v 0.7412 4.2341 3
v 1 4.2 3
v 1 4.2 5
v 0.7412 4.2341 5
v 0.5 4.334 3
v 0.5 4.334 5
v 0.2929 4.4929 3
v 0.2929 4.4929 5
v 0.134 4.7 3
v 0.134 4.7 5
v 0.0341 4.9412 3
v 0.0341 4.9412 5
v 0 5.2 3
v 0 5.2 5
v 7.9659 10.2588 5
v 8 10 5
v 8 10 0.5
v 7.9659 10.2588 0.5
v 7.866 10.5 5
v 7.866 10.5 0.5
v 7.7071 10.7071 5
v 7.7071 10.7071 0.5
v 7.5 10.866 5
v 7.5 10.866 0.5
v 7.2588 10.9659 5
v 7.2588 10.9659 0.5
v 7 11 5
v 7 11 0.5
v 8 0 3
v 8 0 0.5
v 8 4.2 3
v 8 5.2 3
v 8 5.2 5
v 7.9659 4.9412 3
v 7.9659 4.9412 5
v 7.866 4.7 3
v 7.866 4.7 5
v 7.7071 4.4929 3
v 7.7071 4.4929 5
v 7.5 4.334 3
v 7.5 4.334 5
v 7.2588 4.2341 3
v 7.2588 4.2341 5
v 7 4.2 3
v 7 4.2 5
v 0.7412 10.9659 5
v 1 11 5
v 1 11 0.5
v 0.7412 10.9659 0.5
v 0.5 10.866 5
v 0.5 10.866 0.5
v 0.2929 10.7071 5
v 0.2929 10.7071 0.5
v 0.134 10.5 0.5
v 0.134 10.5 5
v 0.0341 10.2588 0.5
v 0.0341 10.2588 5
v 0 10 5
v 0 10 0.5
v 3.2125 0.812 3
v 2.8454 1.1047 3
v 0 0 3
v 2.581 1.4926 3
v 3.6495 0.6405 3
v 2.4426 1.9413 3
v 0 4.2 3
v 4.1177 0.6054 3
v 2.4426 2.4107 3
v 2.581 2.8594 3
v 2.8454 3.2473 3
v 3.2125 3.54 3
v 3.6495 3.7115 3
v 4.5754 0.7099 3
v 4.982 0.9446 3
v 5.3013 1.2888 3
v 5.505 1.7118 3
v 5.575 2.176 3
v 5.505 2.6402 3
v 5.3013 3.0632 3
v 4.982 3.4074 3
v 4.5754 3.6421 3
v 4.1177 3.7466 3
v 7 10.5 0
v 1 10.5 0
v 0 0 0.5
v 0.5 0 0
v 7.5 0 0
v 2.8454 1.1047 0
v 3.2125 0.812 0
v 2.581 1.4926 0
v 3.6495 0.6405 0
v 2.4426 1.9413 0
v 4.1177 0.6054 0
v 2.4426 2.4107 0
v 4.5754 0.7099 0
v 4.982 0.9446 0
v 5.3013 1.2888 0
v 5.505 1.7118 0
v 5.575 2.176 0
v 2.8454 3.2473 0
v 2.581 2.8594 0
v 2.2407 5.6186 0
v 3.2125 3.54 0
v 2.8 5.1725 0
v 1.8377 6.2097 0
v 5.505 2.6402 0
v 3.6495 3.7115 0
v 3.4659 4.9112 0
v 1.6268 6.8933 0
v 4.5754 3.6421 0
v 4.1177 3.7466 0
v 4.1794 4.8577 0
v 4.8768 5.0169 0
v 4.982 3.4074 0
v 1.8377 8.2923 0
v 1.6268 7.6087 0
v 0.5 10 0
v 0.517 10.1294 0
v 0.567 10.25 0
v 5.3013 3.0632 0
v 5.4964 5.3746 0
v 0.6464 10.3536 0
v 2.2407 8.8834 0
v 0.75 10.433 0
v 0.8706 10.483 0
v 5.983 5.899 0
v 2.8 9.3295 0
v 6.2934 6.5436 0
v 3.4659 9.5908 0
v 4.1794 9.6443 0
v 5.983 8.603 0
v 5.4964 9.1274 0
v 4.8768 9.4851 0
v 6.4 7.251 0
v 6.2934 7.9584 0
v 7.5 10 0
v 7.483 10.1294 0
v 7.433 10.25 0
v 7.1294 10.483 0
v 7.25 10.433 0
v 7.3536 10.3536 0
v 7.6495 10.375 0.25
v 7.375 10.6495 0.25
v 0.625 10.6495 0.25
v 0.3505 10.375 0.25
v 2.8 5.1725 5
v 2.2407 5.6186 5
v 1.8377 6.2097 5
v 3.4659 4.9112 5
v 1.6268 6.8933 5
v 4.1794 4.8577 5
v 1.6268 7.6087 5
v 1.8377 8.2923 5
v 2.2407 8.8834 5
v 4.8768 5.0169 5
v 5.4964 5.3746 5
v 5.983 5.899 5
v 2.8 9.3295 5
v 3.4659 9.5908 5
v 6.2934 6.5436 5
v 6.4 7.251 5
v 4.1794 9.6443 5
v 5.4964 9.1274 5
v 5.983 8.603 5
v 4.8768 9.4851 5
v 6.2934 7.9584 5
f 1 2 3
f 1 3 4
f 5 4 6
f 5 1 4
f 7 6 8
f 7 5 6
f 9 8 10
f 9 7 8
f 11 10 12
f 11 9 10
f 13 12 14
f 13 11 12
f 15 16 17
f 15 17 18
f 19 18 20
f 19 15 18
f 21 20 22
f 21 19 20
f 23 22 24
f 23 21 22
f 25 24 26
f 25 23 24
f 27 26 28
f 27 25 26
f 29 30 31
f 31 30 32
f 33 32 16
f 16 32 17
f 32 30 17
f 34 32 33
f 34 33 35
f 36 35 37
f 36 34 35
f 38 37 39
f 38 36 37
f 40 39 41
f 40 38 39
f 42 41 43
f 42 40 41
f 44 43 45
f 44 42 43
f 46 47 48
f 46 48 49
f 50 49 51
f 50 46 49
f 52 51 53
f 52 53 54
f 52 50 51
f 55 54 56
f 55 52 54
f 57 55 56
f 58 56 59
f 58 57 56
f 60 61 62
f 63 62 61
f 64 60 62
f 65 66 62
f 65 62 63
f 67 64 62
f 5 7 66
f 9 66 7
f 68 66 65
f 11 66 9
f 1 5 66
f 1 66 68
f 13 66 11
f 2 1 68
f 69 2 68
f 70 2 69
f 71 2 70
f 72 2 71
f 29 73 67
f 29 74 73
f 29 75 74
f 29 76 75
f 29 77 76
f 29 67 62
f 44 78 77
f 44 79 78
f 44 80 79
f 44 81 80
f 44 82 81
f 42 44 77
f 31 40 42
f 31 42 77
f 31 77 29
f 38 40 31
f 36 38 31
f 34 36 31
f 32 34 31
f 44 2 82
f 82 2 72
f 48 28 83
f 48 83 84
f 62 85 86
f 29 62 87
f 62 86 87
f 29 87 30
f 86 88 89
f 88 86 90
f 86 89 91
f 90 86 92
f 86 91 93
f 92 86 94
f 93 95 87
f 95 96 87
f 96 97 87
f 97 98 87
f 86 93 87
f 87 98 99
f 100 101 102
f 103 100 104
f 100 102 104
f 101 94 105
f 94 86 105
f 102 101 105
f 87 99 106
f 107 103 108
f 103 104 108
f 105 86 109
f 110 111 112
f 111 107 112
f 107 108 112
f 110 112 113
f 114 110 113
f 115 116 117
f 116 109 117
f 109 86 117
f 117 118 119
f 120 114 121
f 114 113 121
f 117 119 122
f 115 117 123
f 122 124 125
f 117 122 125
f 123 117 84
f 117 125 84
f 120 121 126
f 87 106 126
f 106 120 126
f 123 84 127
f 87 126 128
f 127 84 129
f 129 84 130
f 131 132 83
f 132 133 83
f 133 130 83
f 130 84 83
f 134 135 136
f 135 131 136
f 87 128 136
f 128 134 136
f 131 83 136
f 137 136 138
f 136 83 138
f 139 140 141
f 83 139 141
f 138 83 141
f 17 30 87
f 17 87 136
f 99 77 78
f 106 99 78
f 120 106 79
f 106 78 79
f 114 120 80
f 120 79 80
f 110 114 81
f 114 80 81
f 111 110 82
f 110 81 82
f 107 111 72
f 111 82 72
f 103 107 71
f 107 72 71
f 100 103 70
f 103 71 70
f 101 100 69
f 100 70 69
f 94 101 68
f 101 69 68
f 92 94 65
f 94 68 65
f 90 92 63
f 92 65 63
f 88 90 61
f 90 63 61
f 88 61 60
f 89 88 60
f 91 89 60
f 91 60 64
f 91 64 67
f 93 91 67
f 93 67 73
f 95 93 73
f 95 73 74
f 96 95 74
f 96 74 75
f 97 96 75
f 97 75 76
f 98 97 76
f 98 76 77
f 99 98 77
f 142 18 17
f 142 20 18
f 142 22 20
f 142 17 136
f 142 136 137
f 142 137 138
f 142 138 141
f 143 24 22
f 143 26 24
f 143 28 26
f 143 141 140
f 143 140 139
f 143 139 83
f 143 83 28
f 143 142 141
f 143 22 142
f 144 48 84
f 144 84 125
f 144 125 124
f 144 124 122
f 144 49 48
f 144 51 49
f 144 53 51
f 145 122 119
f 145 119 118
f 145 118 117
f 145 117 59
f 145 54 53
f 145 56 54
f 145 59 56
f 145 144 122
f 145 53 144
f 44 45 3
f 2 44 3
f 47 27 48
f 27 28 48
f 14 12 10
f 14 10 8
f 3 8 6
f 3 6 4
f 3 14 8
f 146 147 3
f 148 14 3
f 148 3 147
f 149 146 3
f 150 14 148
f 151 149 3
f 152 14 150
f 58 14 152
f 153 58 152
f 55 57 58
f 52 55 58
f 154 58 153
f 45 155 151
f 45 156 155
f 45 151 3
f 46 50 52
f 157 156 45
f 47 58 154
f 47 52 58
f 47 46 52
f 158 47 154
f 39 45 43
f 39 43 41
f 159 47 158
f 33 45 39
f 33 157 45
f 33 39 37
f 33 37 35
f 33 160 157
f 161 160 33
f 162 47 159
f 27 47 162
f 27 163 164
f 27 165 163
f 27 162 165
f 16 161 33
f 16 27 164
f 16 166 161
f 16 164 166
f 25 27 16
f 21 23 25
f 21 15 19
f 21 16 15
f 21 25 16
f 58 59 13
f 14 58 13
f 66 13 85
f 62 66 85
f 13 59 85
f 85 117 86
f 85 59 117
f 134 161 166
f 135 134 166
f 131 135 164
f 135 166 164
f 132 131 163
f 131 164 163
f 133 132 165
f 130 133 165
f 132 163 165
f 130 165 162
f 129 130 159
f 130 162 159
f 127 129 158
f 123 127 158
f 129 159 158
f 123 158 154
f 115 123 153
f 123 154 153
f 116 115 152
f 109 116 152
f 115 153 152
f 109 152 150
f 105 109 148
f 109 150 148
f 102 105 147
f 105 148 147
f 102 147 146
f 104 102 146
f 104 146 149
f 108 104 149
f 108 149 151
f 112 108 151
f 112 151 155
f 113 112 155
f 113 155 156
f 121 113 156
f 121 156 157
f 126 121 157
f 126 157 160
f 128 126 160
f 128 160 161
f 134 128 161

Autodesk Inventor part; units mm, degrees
ref_plane "YZ Plane" through (0, 0, 0) normal (1, 0, 0) x (0, 1, 0)
ref_plane "XZ Plane" through (0, 0, 0) normal (0, 1, 0) x (-1, 0, 0)
sketch "Sketch1" plane through (0, 0, 0) normal (0, 0, 1) x (1, 0, 0)
  line L0 (0, 0) -> (8, 0)
  line L1 (8, 0) -> (8, 11)
  line L2 (8, 11) -> (0, 11)
  line L3 (0, 11) -> (0, 0)
  dimension "d0" = 8
  dimension "d1" = 11
extrude "Extrusion1" add sketch "Sketch1" along normal blind 5
sketch "Sketch2" plane through (0, 0, 5) normal (0, 0, 1) x (1, 0, 0)
  circle A0 centre (4, 7.251) radius 2.4
  circle A1 centre (4, 2.176) radius 1.575
  line L0 (4, 10.5689) -> (4, 1.2689) construction
  line L1 (0, 11) -> (0, 0) projected
  line L2 (8, 0) -> (8, 11) projected
  dimension "d4" = 3.15
  dimension "d5" = 4.8
  dimension "d6" = 1.1
  dimension "d7" = 4
  dimension "d8" = 4
extrude "Extrusion2" cut sketch "Sketch2" against normal blind 7
sketch "Sketch4" plane through (0, 0, 5) normal (0, 0, 1) x (1, 0, 0)
  line L0 (0, 0) -> (8, 0)
  line L1 (8, 0) -> (8, 4.2)
  line L2 (8, 4.2) -> (0, 4.2)
  line L3 (0, 4.2) -> (0, 0)
  line L4 (8, 0) -> (8, 11) projected
  circle A0 centre (4, 7.251) radius 2.4 projected
  circle A1 centre (4, 2.176) radius 1.575 projected
  dimension "d14" = 4.2
extrude "Extrusion4" cut sketch "Sketch4" against normal blind 2 contours L3 L2 L1 L0
fillet "Rundung1" radius 1 4 edges at (0, 11, 2.5) (8, 11, 2.5) (0, 4.2, 4) (8, 4.2, 4)
chamfer "Fase1" distance 0.5 angle 45 5 edges at (8, 5, 0) (7.7071, 10.7071, 0) (4, 11, 0) (0.2929, 10.7071, 0) (0, 5, 0)
properties part number "holder_test"
